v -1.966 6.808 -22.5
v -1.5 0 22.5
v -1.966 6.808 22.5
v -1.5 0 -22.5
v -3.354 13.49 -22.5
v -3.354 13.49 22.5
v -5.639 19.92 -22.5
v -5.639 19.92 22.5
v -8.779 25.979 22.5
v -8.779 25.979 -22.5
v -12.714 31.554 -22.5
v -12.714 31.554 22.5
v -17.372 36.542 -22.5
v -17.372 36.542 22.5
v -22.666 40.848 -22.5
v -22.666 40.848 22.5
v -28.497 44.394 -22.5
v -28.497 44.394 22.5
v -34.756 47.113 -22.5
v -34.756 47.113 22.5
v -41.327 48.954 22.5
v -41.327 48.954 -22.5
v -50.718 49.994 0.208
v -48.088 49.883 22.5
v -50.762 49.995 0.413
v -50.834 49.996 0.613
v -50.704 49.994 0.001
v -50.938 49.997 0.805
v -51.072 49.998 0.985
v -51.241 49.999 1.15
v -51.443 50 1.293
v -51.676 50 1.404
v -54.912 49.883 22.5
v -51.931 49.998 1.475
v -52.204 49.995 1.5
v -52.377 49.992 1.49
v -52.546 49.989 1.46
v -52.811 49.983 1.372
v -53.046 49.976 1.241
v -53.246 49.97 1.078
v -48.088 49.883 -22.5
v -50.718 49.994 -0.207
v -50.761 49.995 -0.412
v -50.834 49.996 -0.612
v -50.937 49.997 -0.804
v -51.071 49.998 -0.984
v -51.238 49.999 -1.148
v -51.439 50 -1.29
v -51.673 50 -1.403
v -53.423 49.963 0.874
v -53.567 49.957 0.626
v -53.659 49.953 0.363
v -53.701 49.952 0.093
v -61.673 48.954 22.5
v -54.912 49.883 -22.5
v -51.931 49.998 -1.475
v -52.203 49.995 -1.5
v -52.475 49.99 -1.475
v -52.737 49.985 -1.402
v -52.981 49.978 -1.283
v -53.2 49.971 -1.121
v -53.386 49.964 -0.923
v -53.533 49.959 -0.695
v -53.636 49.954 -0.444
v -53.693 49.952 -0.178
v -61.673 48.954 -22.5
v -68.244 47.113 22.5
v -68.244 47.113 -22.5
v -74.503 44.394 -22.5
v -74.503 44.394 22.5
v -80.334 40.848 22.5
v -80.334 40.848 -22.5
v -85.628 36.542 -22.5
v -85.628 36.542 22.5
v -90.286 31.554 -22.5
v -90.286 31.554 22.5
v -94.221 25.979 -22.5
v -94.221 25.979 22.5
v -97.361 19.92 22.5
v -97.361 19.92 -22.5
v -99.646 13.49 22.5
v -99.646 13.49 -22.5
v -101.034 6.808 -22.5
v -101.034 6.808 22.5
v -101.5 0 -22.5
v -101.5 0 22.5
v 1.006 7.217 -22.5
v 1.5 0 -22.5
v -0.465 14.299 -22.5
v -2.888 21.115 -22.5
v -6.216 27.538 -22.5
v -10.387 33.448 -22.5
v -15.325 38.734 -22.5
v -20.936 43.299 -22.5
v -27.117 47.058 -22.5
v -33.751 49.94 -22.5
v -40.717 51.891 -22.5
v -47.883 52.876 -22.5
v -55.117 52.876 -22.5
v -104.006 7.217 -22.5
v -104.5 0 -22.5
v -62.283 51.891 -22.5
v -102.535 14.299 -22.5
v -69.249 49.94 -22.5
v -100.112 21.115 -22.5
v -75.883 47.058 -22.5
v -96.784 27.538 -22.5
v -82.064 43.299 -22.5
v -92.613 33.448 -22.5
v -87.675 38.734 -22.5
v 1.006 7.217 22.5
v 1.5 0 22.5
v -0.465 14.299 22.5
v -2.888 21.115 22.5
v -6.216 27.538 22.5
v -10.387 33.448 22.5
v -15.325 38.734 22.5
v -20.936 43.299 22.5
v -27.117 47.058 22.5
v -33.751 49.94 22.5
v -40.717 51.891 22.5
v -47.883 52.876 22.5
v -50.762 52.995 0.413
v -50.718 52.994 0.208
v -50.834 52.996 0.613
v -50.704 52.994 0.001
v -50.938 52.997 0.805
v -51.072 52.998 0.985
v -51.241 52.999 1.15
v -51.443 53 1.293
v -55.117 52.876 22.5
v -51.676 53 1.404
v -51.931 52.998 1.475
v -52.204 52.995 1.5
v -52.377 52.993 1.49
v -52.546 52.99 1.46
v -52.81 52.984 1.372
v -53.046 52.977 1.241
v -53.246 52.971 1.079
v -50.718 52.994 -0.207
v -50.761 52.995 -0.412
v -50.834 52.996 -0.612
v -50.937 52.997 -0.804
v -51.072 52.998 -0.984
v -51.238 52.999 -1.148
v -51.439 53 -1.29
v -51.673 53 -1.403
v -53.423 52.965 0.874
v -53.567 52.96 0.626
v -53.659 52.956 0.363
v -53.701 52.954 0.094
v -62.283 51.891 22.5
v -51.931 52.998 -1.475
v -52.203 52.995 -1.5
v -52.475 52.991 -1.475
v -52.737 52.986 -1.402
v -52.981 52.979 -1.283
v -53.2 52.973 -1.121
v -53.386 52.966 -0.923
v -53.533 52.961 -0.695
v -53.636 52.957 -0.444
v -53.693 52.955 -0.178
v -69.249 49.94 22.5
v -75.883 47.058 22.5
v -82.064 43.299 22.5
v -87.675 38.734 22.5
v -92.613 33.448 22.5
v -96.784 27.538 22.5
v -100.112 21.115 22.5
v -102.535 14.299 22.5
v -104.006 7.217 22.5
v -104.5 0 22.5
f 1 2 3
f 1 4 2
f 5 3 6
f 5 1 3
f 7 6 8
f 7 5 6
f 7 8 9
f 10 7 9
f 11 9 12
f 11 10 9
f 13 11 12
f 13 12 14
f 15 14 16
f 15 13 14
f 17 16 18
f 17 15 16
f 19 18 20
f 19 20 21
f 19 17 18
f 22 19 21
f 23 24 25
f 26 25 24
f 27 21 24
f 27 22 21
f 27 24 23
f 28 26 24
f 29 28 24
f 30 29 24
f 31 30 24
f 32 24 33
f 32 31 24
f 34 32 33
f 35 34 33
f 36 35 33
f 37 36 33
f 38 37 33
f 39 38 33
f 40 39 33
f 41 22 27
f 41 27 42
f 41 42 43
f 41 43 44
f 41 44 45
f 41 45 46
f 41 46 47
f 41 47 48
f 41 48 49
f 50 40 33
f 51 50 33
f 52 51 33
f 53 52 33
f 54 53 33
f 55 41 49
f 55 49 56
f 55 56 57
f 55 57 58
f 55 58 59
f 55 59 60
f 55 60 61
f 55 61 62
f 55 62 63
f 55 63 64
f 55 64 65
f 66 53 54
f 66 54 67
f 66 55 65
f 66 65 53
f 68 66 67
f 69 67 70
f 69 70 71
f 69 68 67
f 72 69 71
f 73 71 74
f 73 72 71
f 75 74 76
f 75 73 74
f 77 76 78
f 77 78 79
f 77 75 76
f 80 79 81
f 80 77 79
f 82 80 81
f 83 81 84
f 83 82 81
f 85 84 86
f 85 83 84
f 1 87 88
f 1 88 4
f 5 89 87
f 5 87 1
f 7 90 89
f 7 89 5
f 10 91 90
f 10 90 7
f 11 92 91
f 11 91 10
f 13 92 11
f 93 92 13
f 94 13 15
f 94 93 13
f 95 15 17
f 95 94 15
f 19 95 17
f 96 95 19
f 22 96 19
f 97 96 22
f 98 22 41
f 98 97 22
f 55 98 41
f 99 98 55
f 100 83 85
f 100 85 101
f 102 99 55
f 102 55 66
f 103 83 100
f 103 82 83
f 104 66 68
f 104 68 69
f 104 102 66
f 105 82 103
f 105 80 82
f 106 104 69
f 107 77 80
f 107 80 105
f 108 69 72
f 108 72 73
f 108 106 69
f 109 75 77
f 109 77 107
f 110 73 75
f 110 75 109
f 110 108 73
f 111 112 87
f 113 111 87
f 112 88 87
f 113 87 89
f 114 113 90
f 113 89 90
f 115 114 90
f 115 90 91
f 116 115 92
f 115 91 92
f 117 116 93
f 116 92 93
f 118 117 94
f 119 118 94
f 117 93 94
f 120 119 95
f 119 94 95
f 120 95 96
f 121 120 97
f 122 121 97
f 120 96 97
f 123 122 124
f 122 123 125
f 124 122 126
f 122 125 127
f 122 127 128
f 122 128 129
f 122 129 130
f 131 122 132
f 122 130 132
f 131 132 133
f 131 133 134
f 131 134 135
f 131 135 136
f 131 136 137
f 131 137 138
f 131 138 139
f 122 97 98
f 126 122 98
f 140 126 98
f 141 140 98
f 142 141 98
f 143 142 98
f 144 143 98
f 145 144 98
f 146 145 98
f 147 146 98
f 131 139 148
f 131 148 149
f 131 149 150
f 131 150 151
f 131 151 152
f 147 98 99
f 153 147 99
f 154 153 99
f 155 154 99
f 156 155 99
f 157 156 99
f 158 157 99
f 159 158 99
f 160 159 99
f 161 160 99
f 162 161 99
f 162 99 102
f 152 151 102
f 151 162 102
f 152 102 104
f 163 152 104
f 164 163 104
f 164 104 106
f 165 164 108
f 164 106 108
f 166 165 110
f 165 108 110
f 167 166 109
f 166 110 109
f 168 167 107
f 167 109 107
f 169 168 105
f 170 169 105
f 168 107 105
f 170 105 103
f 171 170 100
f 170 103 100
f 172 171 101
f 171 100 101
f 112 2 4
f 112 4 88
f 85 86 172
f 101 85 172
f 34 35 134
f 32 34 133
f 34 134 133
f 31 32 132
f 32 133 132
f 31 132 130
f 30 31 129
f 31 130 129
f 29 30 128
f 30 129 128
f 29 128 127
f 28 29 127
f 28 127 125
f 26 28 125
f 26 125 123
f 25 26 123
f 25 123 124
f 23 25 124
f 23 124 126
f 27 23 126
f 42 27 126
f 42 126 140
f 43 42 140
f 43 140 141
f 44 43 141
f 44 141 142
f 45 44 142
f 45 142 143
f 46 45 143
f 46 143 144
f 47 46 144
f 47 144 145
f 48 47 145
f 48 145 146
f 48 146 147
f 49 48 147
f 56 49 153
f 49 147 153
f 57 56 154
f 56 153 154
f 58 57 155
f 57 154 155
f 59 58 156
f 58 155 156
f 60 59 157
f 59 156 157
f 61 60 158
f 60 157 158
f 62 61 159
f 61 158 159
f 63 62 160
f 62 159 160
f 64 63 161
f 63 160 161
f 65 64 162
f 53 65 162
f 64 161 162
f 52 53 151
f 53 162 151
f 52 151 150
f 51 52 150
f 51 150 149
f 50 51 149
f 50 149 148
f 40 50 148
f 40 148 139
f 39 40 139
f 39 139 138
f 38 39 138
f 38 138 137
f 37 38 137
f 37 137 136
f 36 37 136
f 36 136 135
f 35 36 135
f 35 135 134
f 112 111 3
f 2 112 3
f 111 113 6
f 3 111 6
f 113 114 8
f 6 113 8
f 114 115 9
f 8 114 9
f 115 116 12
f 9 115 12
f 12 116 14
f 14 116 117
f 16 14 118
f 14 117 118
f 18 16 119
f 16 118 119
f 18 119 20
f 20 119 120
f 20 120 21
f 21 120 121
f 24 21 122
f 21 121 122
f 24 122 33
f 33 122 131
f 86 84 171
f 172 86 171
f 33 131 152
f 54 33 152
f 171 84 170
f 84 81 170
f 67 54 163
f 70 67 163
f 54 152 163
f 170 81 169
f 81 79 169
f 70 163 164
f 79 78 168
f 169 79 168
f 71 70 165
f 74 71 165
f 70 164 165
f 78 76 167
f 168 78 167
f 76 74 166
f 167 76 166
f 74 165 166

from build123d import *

# Parameters (mm, degrees)
SKETCH1_W          = 3
SKETCH1_H          = 45
REVOLVE1_ANGLE     = 180
SKETCH2_R          = 1.5
CUT_EXTRUDE1_DEPTH = 10


with BuildPart() as part:
    # Sketch1 → Revolve1 (revolve)
    with BuildSketch(Plane(origin=(0, 0, 0), x_dir=(1, 0, 0), z_dir=(0, 1, 0))):
        Rectangle(SKETCH1_W, SKETCH1_H)
    revolve(axis=Axis((-51.5, 0, -27.834324949), (0, 0, 1)), revolution_arc=REVOLVE1_ANGLE)

    # Sketch2 → Cut-Extrude1 (cut)
    with BuildSketch(Plane(origin=(0, 54, 0), x_dir=(1, 0, 0), z_dir=(0, 1, 0))):
        with Locations(Location((-52.203545166, 0, 0), (0, 0, 270))):
            Circle(SKETCH2_R)
    extrude(amount=-CUT_EXTRUDE1_DEPTH, mode=Mode.SUBTRACT)


solid = part.part
